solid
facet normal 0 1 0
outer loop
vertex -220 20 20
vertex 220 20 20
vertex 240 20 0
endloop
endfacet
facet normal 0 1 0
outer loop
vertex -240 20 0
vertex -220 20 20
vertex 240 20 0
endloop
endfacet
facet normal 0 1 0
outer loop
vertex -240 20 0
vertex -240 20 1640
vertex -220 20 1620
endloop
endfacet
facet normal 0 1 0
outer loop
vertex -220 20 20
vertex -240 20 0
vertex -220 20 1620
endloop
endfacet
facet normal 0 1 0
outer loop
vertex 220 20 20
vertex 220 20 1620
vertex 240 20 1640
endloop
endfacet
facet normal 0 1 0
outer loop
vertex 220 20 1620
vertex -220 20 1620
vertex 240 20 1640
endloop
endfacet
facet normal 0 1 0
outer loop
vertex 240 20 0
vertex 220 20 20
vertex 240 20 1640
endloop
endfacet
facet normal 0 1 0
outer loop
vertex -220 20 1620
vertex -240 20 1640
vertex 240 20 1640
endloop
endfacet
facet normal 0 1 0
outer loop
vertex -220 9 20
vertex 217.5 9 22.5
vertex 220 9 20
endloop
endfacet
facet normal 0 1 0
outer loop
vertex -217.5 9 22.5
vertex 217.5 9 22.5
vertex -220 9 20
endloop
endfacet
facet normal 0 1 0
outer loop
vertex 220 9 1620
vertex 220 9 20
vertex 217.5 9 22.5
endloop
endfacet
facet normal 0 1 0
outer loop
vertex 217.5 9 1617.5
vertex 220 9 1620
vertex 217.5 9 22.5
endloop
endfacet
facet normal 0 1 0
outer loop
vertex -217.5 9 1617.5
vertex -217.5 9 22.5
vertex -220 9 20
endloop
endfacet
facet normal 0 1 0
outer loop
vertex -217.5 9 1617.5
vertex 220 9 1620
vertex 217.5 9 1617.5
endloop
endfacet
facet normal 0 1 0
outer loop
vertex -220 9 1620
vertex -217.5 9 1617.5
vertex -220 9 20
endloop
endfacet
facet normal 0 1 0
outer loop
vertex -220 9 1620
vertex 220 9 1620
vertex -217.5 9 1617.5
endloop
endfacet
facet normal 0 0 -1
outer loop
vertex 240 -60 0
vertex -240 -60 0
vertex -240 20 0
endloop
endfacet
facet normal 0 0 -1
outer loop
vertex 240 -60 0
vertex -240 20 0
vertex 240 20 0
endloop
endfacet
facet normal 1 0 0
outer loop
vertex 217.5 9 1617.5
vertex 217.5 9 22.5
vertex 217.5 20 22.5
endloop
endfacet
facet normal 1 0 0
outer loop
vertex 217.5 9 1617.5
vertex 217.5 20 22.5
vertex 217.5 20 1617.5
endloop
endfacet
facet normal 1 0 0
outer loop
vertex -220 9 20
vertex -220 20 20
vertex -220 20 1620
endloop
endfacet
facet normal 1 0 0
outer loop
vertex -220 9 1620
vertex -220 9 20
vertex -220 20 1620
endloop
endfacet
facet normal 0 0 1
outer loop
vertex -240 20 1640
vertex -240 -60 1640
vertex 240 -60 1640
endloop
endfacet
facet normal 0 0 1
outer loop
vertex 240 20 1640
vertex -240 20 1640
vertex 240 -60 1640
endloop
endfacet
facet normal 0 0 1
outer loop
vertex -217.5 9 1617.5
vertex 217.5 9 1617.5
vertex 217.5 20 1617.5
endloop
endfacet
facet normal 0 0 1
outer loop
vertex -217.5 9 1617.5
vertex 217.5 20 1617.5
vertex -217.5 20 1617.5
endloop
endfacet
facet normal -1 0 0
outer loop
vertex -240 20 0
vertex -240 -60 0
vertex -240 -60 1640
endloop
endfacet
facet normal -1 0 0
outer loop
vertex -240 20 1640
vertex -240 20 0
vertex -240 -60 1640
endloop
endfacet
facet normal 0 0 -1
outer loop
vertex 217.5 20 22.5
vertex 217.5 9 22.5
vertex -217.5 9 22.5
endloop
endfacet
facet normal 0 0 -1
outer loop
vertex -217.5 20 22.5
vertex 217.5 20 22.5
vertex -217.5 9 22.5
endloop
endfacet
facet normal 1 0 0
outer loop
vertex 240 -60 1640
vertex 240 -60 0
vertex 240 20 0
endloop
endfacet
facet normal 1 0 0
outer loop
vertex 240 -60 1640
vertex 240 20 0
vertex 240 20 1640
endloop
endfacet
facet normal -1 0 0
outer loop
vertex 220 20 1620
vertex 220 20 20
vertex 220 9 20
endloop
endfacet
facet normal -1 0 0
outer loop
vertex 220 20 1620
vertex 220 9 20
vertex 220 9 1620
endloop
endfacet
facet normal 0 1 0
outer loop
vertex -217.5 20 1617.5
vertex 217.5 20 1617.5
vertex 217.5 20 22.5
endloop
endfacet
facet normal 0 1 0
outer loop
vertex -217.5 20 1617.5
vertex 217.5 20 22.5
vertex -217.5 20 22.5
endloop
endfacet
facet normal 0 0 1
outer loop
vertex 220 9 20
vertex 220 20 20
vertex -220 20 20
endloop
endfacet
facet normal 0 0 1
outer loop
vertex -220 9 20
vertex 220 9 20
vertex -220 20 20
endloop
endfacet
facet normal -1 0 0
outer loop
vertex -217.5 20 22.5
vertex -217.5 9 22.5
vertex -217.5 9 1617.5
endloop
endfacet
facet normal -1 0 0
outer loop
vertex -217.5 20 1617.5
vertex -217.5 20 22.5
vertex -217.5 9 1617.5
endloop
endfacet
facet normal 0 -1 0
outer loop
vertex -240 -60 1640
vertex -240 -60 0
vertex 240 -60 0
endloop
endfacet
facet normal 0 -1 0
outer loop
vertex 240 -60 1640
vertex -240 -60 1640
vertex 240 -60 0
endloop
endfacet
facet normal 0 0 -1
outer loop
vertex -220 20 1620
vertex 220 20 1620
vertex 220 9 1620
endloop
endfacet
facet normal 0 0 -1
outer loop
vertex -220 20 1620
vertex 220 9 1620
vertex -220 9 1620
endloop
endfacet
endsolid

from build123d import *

# Parameters (mm, degrees)
SKETCH1_W           = 480
SKETCH1_H           = 1640
BOSS_EXTRUDE1_DEPTH = 80
SKETCH2_W           = 440
SKETCH2_H           = 1600
CUT_EXTRUDE1_DEPTH  = 11
SKETCH3_W           = 435
SKETCH3_H           = 1595
BOSS_EXTRUDE2_DEPTH = 11


with BuildPart() as part:
    # Sketch1 → Boss-Extrude1 (new body)
    with BuildSketch(Plane.XZ.offset(60)):
        with Locations((0, 820)):
            Rectangle(SKETCH1_W, SKETCH1_H)
    extrude(amount=-BOSS_EXTRUDE1_DEPTH)

    # Sketch2 → Cut-Extrude1 (cut)
    with BuildSketch(Plane(origin=(0, 20, 0), x_dir=(-1, 0, 0), z_dir=(0, 1, 0))):
        with Locations((0, 820)):
            Rectangle(SKETCH2_W, SKETCH2_H)
    extrude(amount=-CUT_EXTRUDE1_DEPTH, mode=Mode.SUBTRACT)

    # Sketch3 → Boss-Extrude2 (add)
    with BuildSketch(Plane(origin=(0, 9, 0), x_dir=(-1, 0, 0), z_dir=(0, 1, 0))):
        with Locations((0, 820)):
            Rectangle(SKETCH3_W, SKETCH3_H)
    extrude(amount=BOSS_EXTRUDE2_DEPTH)


solid = part.part
